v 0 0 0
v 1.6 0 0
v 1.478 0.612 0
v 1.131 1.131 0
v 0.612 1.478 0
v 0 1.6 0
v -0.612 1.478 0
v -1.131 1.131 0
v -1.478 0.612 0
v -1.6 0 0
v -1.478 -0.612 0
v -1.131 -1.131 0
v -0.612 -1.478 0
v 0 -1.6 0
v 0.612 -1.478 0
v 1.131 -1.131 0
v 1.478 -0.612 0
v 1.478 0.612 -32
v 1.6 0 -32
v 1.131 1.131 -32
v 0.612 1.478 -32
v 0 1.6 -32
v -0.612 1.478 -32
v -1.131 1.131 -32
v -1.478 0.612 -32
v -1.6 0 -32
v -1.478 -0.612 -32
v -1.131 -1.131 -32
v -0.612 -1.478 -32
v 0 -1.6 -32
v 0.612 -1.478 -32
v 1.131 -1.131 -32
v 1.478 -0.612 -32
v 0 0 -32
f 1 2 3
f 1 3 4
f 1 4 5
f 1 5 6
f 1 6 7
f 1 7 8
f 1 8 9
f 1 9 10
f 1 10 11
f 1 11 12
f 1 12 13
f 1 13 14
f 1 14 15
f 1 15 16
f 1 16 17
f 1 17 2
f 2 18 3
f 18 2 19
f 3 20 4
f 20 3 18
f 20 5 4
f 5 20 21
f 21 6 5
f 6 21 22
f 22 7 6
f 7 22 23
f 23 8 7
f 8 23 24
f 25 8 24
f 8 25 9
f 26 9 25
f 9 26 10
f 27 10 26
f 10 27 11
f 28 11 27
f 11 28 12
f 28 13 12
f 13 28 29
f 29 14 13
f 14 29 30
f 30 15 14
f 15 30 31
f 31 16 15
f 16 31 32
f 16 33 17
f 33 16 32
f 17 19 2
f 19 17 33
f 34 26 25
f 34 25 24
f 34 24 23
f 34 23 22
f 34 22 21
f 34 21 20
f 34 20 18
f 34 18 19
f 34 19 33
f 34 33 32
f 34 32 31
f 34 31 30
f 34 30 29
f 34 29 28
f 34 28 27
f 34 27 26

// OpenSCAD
// file: ../p/stud3.scad
use <../lib.scad>
use <4-4cyli.scad>
use <4-4disc.scad>
use <4-4edge.scad>
$fa=1; $fs=0.2;
function ldraw_lib__stud3(realsolid=false) = realsolid ? 
    [openscad(translate([0,0,-eps()], o=cylinder(4+eps(), r=4)),2)] : [
// 0 Stud Tube Solid
// 0 Name: stud3.dat
// 0 Author: James Jessiman
// 0 !LDRAW_ORG Primitive UPDATE 2012-01
// 0 !LICENSE Licensed under CC BY 2.0 and CC BY 4.0 : see CAreadme.txt
// 
// 0 BFC CERTIFY CCW
  [0,"BFC","CERTIFY"],
  [0,"BFC","CCW"],
// 
// 0 !HISTORY 2002-04-04 [sbliss] Modified for BFC compliance
// 0 !HISTORY 2002-04-25 [PTadmin] Official Update 2002-02
// 0 !HISTORY 2007-06-24 [PTadmin] Header formatted for Contributor Agreement
// 0 !HISTORY 2008-07-01 [PTadmin] Official Update 2008-01
// 0 !HISTORY 2012-02-16 [Philo] Changed to CCW
// 0 !HISTORY 2012-03-30 [PTadmin] Official Update 2012-01
// 
// 
// 1 16 0 -4 0 4 0 0 0 1 0 0 0 4 4-4edge.dat
  [1,16,0,-4,0,4,0,0,0,1,0,0,0,4, ldraw_lib__4_4edge(realsolid)],
// 1 16 0 0 0 4 0 0 0 1 0 0 0 4 4-4edge.dat
  [1,16,0,0,0,4,0,0,0,1,0,0,0,4, ldraw_lib__4_4edge(realsolid)],
// 1 16 0 -4 0 4 0 0 0 1 0 0 0 4 4-4disc.dat
  [1,16,0,-4,0,4,0,0,0,1,0,0,0,4, ldraw_lib__4_4disc(realsolid)],
// 1 16 0 -4 0 4 0 0 0 4 0 0 0 4 4-4cyli.dat
  [1,16,0,-4,0,4,0,0,0,4,0,0,0,4, ldraw_lib__4_4cyli(realsolid)],
];
module ldraw_lib__stud3(step=0, col=false, unit=2/5, alt=false, line=0.2, solid=!$preview)
    makepoly(ldraw_lib__stud3(solid), step=step, col=col, unit=unit, alt=alt, line=line, solid=solid);
ldraw_lib__stud3(line=0.2);
// file: ../p/stud.scad
use <../lib.scad>
use <4-4cyli.scad>
use <4-4disc.scad>
use <4-4edge.scad>
$fa=1; $fs=0.2;
function ldraw_lib__stud(realsolid=false) = realsolid ? 
    [openscad(translate([0,0,-eps()], o=cylinder(4+eps(), r=6)),2)] : [
// 0 Stud
// 0 Name: stud.dat
// 0 Author: James Jessiman
// 0 !LDRAW_ORG Primitive UPDATE 2012-01
// 0 !LICENSE Licensed under CC BY 2.0 and CC BY 4.0 : see CAreadme.txt
// 
// 0 BFC CERTIFY CCW
  [0,"BFC","CERTIFY"],
  [0,"BFC","CCW"],
// 
// 0 !HISTORY 2002-04-04 [sbliss] Modified for BFC compliance
// 0 !HISTORY 2002-04-25 [PTadmin] Official Update 2002-02
// 0 !HISTORY 2007-06-24 [PTadmin] Header formatted for Contributor Agreement
// 0 !HISTORY 2008-07-01 [PTadmin] Official Update 2008-01
// 0 !HISTORY 2012-02-16 [Philo] Changed to CCW
// 0 !HISTORY 2012-03-30 [PTadmin] Official Update 2012-01
// 
// 
// 1 16 0 0 0 6 0 0 0 1 0 0 0 6 4-4edge.dat
  [1,16,0,0,0,6,0,0,0,1,0,0,0,6, ldraw_lib__4_4edge(realsolid)],
// 1 16 0 -4 0 6 0 0 0 1 0 0 0 6 4-4edge.dat
  [1,16,0,-4,0,6,0,0,0,1,0,0,0,6, ldraw_lib__4_4edge(realsolid)],
// 1 16 0 0 0 6 0 0 0 -4 0 0 0 6 4-4cyli.dat
  [1,16,0,0,0,6,0,0,0,-4,0,0,0,6, ldraw_lib__4_4cyli(realsolid)],
// 1 16 0 -4 0 6 0 0 0 1 0 0 0 6 4-4disc.dat
  [1,16,0,-4,0,6,0,0,0,1,0,0,0,6, ldraw_lib__4_4disc(realsolid)],
];
module ldraw_lib__stud(step=0, col=false, unit=2/5, alt=false, line=0.2, solid=!$preview)
    makepoly(ldraw_lib__stud(solid), step=step, col=col, unit=unit, alt=alt, line=line, solid=solid);
ldraw_lib__stud(line=0.2);
// file: ../p/box5.scad
use <../lib.scad>
$fa=1; $fs=0.2;
function ldraw_lib__box5(realsolid=false) = [
// 0 Box with 5 Faces and All Edges
// 0 Name: box5.dat
// 0 Author: James Jessiman
// 0 !LDRAW_ORG Primitive UPDATE 2012-01
// 0 !LICENSE Licensed under CC BY 2.0 and CC BY 4.0 : see CAreadme.txt
// 
// 0 BFC CERTIFY CCW
  [0,"BFC","CERTIFY"],
  [0,"BFC","CCW"],
// 
// 0 !HISTORY 2002-04-03 [sbliss] Modified for BFC compliance
// 0 !HISTORY 2002-04-25 [PTadmin] Official Update 2002-02
// 0 !HISTORY 2007-06-24 [PTadmin] Header formatted for Contributor Agreement
// 0 !HISTORY 2008-07-01 [PTadmin] Official Update 2008-01
// 0 !HISTORY 2012-02-16 [Philo] Changed to CCW
// 0 !HISTORY 2012-03-30 [PTadmin] Official Update 2012-01
// 
// 
// 2 24 1 1 1 -1 1 1
  [2,24,1,1,1,-1,1,1],
// 2 24 -1 1 1 -1 1 -1
  [2,24,-1,1,1,-1,1,-1],
// 2 24 -1 1 -1 1 1 -1
  [2,24,-1,1,-1,1,1,-1],
// 2 24 1 1 -1 1 1 1
  [2,24,1,1,-1,1,1,1],
// 2 24 1 0 1 -1 0 1
  [2,24,1,0,1,-1,0,1],
// 2 24 -1 0 1 -1 0 -1
  [2,24,-1,0,1,-1,0,-1],
// 2 24 -1 0 -1 1 0 -1
  [2,24,-1,0,-1,1,0,-1],
// 2 24 1 0 -1 1 0 1
  [2,24,1,0,-1,1,0,1],
// 2 24 1 0 1 1 1 1
  [2,24,1,0,1,1,1,1],
// 2 24 -1 0 1 -1 1 1
  [2,24,-1,0,1,-1,1,1],
// 2 24 1 0 -1 1 1 -1
  [2,24,1,0,-1,1,1,-1],
// 2 24 -1 0 -1 -1 1 -1
  [2,24,-1,0,-1,-1,1,-1],
// 4 16 -1 1 1 1 1 1 1 1 -1 -1 1 -1
  [4,16,-1,1,1,1,1,1,1,1,-1,-1,1,-1],
// 4 16 -1 1 1 -1 0 1 1 0 1 1 1 1
  [4,16,-1,1,1,-1,0,1,1,0,1,1,1,1],
// 4 16 -1 1 -1 -1 0 -1 -1 0 1 -1 1 1
  [4,16,-1,1,-1,-1,0,-1,-1,0,1,-1,1,1],
// 4 16 1 1 -1 1 0 -1 -1 0 -1 -1 1 -1
  [4,16,1,1,-1,1,0,-1,-1,0,-1,-1,1,-1],
// 4 16 1 1 1 1 0 1 1 0 -1 1 1 -1
  [4,16,1,1,1,1,0,1,1,0,-1,1,1,-1],
];
module ldraw_lib__box5(step=0, col=false, unit=2/5, alt=false, line=0.2, solid=!$preview)
    makepoly(ldraw_lib__box5(solid), step=step, col=col, unit=unit, alt=alt, line=line, solid=solid);
ldraw_lib__box5(line=0.2);
// file: ../p/box4t.scad
use <../lib.scad>
$fa=1; $fs=0.2;
function ldraw_lib__box4t(realsolid=false) = [
// 0 Box with 4 Adjacent Faces and All Edges
// 0 Name: box4t.dat
// 0 Author: Tore Eriksson [Tore_Eriksson]
// 0 !LDRAW_ORG Primitive UPDATE 2003-02
// 0 !LICENSE Licensed under CC BY 2.0 and CC BY 4.0 : see CAreadme.txt
// 
// 0 BFC CERTIFY CCW
  [0,"BFC","CERTIFY"],
  [0,"BFC","CCW"],
// 
// 0 !HISTORY 1997-09-29 [PTadmin] Official Update 1997-15
// 0 !HISTORY 2002-08-31 [izanette] Modified with WINDZ for BFC compliance
// 0 !HISTORY 2003-08-01 [PTadmin] Official Update 2003-02
// 0 !HISTORY 2007-06-24 [PTadmin] Header formatted for Contributor Agreement
// 0 !HISTORY 2008-07-01 [PTadmin] Official Update 2008-01
// 
// 
// 2 24 1 1 1 -1 1 1
  [2,24,1,1,1,-1,1,1],
// 2 24 -1 1 1 -1 1 -1
  [2,24,-1,1,1,-1,1,-1],
// 2 24 -1 1 -1 1 1 -1
  [2,24,-1,1,-1,1,1,-1],
// 2 24 1 1 -1 1 1 1
  [2,24,1,1,-1,1,1,1],
// 2 24 1 0 1 -1 0 1
  [2,24,1,0,1,-1,0,1],
// 2 24 -1 0 1 -1 0 -1
  [2,24,-1,0,1,-1,0,-1],
// 2 24 -1 0 -1 1 0 -1
  [2,24,-1,0,-1,1,0,-1],
// 2 24 1 0 -1 1 0 1
  [2,24,1,0,-1,1,0,1],
// 2 24 1 0 1 1 1 1
  [2,24,1,0,1,1,1,1],
// 2 24 -1 0 1 -1 1 1
  [2,24,-1,0,1,-1,1,1],
// 2 24 1 0 -1 1 1 -1
  [2,24,1,0,-1,1,1,-1],
// 2 24 -1 0 -1 -1 1 -1
  [2,24,-1,0,-1,-1,1,-1],
// 4 16 1 1 1 1 1 -1 -1 1 -1 -1 1 1
  [4,16,1,1,1,1,1,-1,-1,1,-1,-1,1,1],
// 4 16 1 1 1 -1 1 1 -1 0 1 1 0 1
  [4,16,1,1,1,-1,1,1,-1,0,1,1,0,1],
// 4 16 -1 1 1 -1 1 -1 -1 0 -1 -1 0 1
  [4,16,-1,1,1,-1,1,-1,-1,0,-1,-1,0,1],
// 0 4 16 -1 1 -1 -1 0 -1 1 0 -1 1 1 -1
// 4 16 1 1 -1 1 1 1 1 0 1 1 0 -1
  [4,16,1,1,-1,1,1,1,1,0,1,1,0,-1],
// 0
];
module ldraw_lib__box4t(step=0, col=false, unit=2/5, alt=false, line=0.2, solid=!$preview)
    makepoly(ldraw_lib__box4t(solid), step=step, col=col, unit=unit, alt=alt, line=line, solid=solid);
ldraw_lib__box4t(line=0.2);
// file: s/3004s01.scad
use <../../lib.scad>
use <../../p/box4t.scad>
use <../../p/box5.scad>
use <../../p/stud.scad>
use <../../p/stud3.scad>
$fa=1; $fs=0.2;
function ldraw_lib__s__3004s01(realsolid=false) = [
// 0 ~Brick  1 x  2 without Front Face
// 0 Name: s\3004s01.dat
// 0 Author: James Jessiman
// 0 !LDRAW_ORG Subpart UPDATE 2003-03
// 0 !LICENSE Licensed under CC BY 2.0 and CC BY 4.0 : see CAreadme.txt
// 
// 0 BFC CERTIFY CCW
  [0,"BFC","CERTIFY"],
  [0,"BFC","CCW"],
// 
// 0 !HISTORY 2003-09-07 [jriley] Subfiling, BFC
// 0 !HISTORY 2003-12-19 [PTadmin] Official Update 2003-03
// 0 !HISTORY 2007-08-29 [PTadmin] Header formatted for Contributor Agreement
// 0 !HISTORY 2008-07-01 [PTadmin] Official Update 2008-01
// 
// 
// 1 16 0 4 0 1 0 0 0 -5 0 0 0 1 stud3.dat
  [1,16,0,4,0,1,0,0,0,-5,0,0,0,1, ldraw_lib__stud3(realsolid)],
// 0 BFC INVERTNEXT
  [0,"BFC","INVERTNEXT"],
// 1 16 0 24 0 16 0 0 0 -20 0 0 0 6 box5.dat
  [1,16,0,24,0,16,0,0,0,-20,0,0,0,6, ldraw_lib__box5(realsolid)],
// 4 16 20 24 10 16 24 6 -16 24 6 -20 24 10
  [4,16,20,24,10,16,24,6,-16,24,6,-20,24,10],
// 4 16 -20 24 10 -16 24 6 -16 24 -6 -20 24 -10
  [4,16,-20,24,10,-16,24,6,-16,24,-6,-20,24,-10],
// 4 16 -20 24 -10 -16 24 -6 16 24 -6 20 24 -10
  [4,16,-20,24,-10,-16,24,-6,16,24,-6,20,24,-10],
// 4 16 20 24 -10 16 24 -6 16 24 6 20 24 10
  [4,16,20,24,-10,16,24,-6,16,24,6,20,24,10],
// 1 16 0 24 0 20 0 0 0 -24 0 0 0 10 box4t.dat
  [1,16,0,24,0,20,0,0,0,-24,0,0,0,10, ldraw_lib__box4t(realsolid)],
// 1 16 10 0 0 1 0 0 0 1 0 0 0 1 stud.dat
  [1,16,10,0,0,1,0,0,0,1,0,0,0,1, ldraw_lib__stud(realsolid)],
// 1 16 -10 0 0 1 0 0 0 1 0 0 0 1 stud.dat
  [1,16,-10,0,0,1,0,0,0,1,0,0,0,1, ldraw_lib__stud(realsolid)],
// 0
];
module ldraw_lib__s__3004s01(step=0, col=false, unit=2/5, alt=false, line=0.2, solid=!$preview)
    makepoly(ldraw_lib__s__3004s01(solid), step=step, col=col, unit=unit, alt=alt, line=line, solid=solid);
ldraw_lib__s__3004s01(line=0.2);
// file: 3004.scad
use <../lib.scad>
use <s/3004s01.scad>
$fa=1; $fs=0.2;
function ldraw_lib__3004(realsolid=false) = [
// 0 Brick  1 x  2
// 0 Name: 3004.dat
// 0 Author: James Jessiman
// 0 !LDRAW_ORG Part UPDATE 2022-05
// 0 !LICENSE Licensed under CC BY 2.0 and CC BY 4.0 : see CAreadme.txt
// 
// 0 BFC CERTIFY CCW
  [0,"BFC","CERTIFY"],
  [0,"BFC","CCW"],
// 
// 0 !HISTORY 2001-10-26 [PTadmin] Official Update 2001-01
// 0 !HISTORY 2002-05-07 {unknown} BFC Certification
// 0 !HISTORY 2002-06-11 [PTadmin] Official Update 2002-03
// 0 !HISTORY 2007-05-07 [PTadmin] Header formatted for Contributor Agreement
// 0 !HISTORY 2008-07-01 [PTadmin] Official Update 2008-01
// 0 !HISTORY 2022-08-04 [MagFors] Using subfile
// 0 !HISTORY 2022-09-15 [PTadmin] Official Update 2022-05
// 
// 
// 1 16 0 0 0 1 0 0 0 1 0 0 0 1 s\3004s01.dat
  [1,16,0,0,0,1,0,0,0,1,0,0,0,1, ldraw_lib__s__3004s01(realsolid)],
// 4 16 -20 24 -10 20 24 -10 20 0 -10 -20 0 -10
  [4,16,-20,24,-10,20,24,-10,20,0,-10,-20,0,-10],
];
module ldraw_lib__3004(step=0, col=false, unit=2/5, alt=false, line=0.2, solid=!$preview)
    makepoly(ldraw_lib__3004(solid), step=step, col=col, unit=unit, alt=alt, line=line, solid=solid);
ldraw_lib__3004(line=0.2);
// file: ../p/4-4edge.scad
use <../lib.scad>
$fa=1; $fs=0.2;
function ldraw_lib__4_4edge(realsolid=false) = [
// 0 Circle 1.0
// 0 Name: 4-4edge.dat
// 0 Author: James Jessiman
// 0 !LDRAW_ORG Primitive UPDATE 2017-01
// 0 !LICENSE Licensed under CC BY 2.0 and CC BY 4.0 : see CAreadme.txt
// 
// 0 BFC CERTIFY CCW
  [0,"BFC","CERTIFY"],
  [0,"BFC","CCW"],
// 
// 0 !HISTORY 1998-12-15 [PTadmin] Official Update 1998-10
// 0 !HISTORY 2005-12-28 [PTadmin] Official Update 2005-01
// 0 !HISTORY 2007-06-24 [PTadmin] Header formatted for Contributor Agreement
// 0 !HISTORY 2008-07-01 [PTadmin] Official Update 2008-01
// 0 !HISTORY 2017-01-15 [Steffen] BFCed
// 0 !HISTORY 2017-12-30 [PTadmin] Official Update 2017-01
// 
// 
// 2 24 1 0 0 0.9239 0 0.3827
  [2,24,1,0,0,0.9239,0,0.3827],
// 2 24 0.9239 0 0.3827 0.7071 0 0.7071
  [2,24,0.9239,0,0.3827,0.7071,0,0.7071],
// 2 24 0.7071 0 0.7071 0.3827 0 0.9239
  [2,24,0.7071,0,0.7071,0.3827,0,0.9239],
// 2 24 0.3827 0 0.9239 0 0 1
  [2,24,0.3827,0,0.9239,0,0,1],
// 2 24 0 0 1 -0.3827 0 0.9239
  [2,24,0,0,1,-0.3827,0,0.9239],
// 2 24 -0.3827 0 0.9239 -0.7071 0 0.7071
  [2,24,-0.3827,0,0.9239,-0.7071,0,0.7071],
// 2 24 -0.7071 0 0.7071 -0.9239 0 0.3827
  [2,24,-0.7071,0,0.7071,-0.9239,0,0.3827],
// 2 24 -0.9239 0 0.3827 -1 0 -0
  [2,24,-0.9239,0,0.3827,-1,0,-0],
// 2 24 -1 0 -0 -0.9239 0 -0.3827
  [2,24,-1,0,-0,-0.9239,0,-0.3827],
// 2 24 -0.9239 0 -0.3827 -0.7071 0 -0.7071
  [2,24,-0.9239,0,-0.3827,-0.7071,0,-0.7071],
// 2 24 -0.7071 0 -0.7071 -0.3827 0 -0.9239
  [2,24,-0.7071,0,-0.7071,-0.3827,0,-0.9239],
// 2 24 -0.3827 0 -0.9239 0 0 -1
  [2,24,-0.3827,0,-0.9239,0,0,-1],
// 2 24 0 0 -1 0.3827 0 -0.9239
  [2,24,0,0,-1,0.3827,0,-0.9239],
// 2 24 0.3827 0 -0.9239 0.7071 0 -0.7071
  [2,24,0.3827,0,-0.9239,0.7071,0,-0.7071],
// 2 24 0.7071 0 -0.7071 0.9239 0 -0.3827
  [2,24,0.7071,0,-0.7071,0.9239,0,-0.3827],
// 2 24 0.9239 0 -0.3827 1 0 0
  [2,24,0.9239,0,-0.3827,1,0,0],
];
module ldraw_lib__4_4edge(step=0, col=false, unit=2/5, alt=false, line=0.2, solid=!$preview)
    makepoly(ldraw_lib__4_4edge(solid), step=step, col=col, unit=unit, alt=alt, line=line, solid=solid);
ldraw_lib__4_4edge(line=0.2);
// file: ../p/4-4disc.scad
use <../lib.scad>
$fa=1; $fs=0.2;
function ldraw_lib__4_4disc(realsolid=false) = [
// 0 Disc 1.0
// 0 Name: 4-4disc.dat
// 0 Author: James Jessiman
// 0 !LDRAW_ORG Primitive UPDATE 2002-02
// 0 !LICENSE Licensed under CC BY 2.0 and CC BY 4.0 : see CAreadme.txt
// 
// 0 BFC CERTIFY CCW
  [0,"BFC","CERTIFY"],
  [0,"BFC","CCW"],
// 
// 0 !HISTORY 1998-12-15 [PTadmin] Official Update 1998-10
// 0 !HISTORY 2002-03-23 [sbliss] Added BFC statement
// 0 !HISTORY 2002-04-25 [PTadmin] Official Update 2002-02
// 0 !HISTORY 2007-06-24 [PTadmin] Header formatted for Contributor Agreement
// 0 !HISTORY 2008-07-01 [PTadmin] Official Update 2008-01
// 
// 
// 3 16 0 0 0 1 0 0 0.9239 0 0.3827
  [3,16,0,0,0,1,0,0,0.9239,0,0.3827],
// 3 16 0 0 0 0.9239 0 0.3827 0.7071 0 0.7071
  [3,16,0,0,0,0.9239,0,0.3827,0.7071,0,0.7071],
// 3 16 0 0 0 0.7071 0 0.7071 0.3827 0 0.9239
  [3,16,0,0,0,0.7071,0,0.7071,0.3827,0,0.9239],
// 3 16 0 0 0 0.3827 0 0.9239 0 0 1
  [3,16,0,0,0,0.3827,0,0.9239,0,0,1],
// 3 16 0 0 0 0 0 1 -0.3827 0 0.9239
  [3,16,0,0,0,0,0,1,-0.3827,0,0.9239],
// 3 16 0 0 0 -0.3827 0 0.9239 -0.7071 0 0.7071
  [3,16,0,0,0,-0.3827,0,0.9239,-0.7071,0,0.7071],
// 3 16 0 0 0 -0.7071 0 0.7071 -0.9239 0 0.3827
  [3,16,0,0,0,-0.7071,0,0.7071,-0.9239,0,0.3827],
// 3 16 0 0 0 -0.9239 0 0.3827 -1 0 -0
  [3,16,0,0,0,-0.9239,0,0.3827,-1,0,-0],
// 3 16 0 0 0 -1 0 -0 -0.9239 0 -0.3827
  [3,16,0,0,0,-1,0,-0,-0.9239,0,-0.3827],
// 3 16 0 0 0 -0.9239 0 -0.3827 -0.7071 0 -0.7071
  [3,16,0,0,0,-0.9239,0,-0.3827,-0.7071,0,-0.7071],
// 3 16 0 0 0 -0.7071 0 -0.7071 -0.3827 0 -0.9239
  [3,16,0,0,0,-0.7071,0,-0.7071,-0.3827,0,-0.9239],
// 3 16 0 0 0 -0.3827 0 -0.9239 0 0 -1
  [3,16,0,0,0,-0.3827,0,-0.9239,0,0,-1],
// 3 16 0 0 0 0 0 -1 0.3827 0 -0.9239
  [3,16,0,0,0,0,0,-1,0.3827,0,-0.9239],
// 3 16 0 0 0 0.3827 0 -0.9239 0.7071 0 -0.7071
  [3,16,0,0,0,0.3827,0,-0.9239,0.7071,0,-0.7071],
// 3 16 0 0 0 0.7071 0 -0.7071 0.9239 0 -0.3827
  [3,16,0,0,0,0.7071,0,-0.7071,0.9239,0,-0.3827],
// 3 16 0 0 0 0.9239 0 -0.3827 1 0 0
  [3,16,0,0,0,0.9239,0,-0.3827,1,0,0],
// 0
];
module ldraw_lib__4_4disc(step=0, col=false, unit=2/5, alt=false, line=0.2, solid=!$preview)
    makepoly(ldraw_lib__4_4disc(solid), step=step, col=col, unit=unit, alt=alt, line=line, solid=solid);
ldraw_lib__4_4disc(line=0.2);
// file: ../p/4-4cyli.scad
use <../lib.scad>
$fa=1; $fs=0.2;
function ldraw_lib__4_4cyli(realsolid=false) = [
// 0 Cylinder 1.0
// 0 Name: 4-4cyli.dat
// 0 Author: James Jessiman
// 0 !LDRAW_ORG Primitive UPDATE 2005-01
// 0 !LICENSE Licensed under CC BY 2.0 and CC BY 4.0 : see CAreadme.txt
// 
// 0 BFC CERTIFY CCW
  [0,"BFC","CERTIFY"],
  [0,"BFC","CCW"],
// 
// 0 !HISTORY 1998-12-15 [PTadmin] Official Update 1998-10
// 0 !HISTORY 2002-03-23 [sbliss] Added BFC statement; merged headers from files in distributions LDraw 0.27 and Complete.
// 0 !HISTORY 2002-04-25 [PTadmin] Official Update 2002-02
// 0 !HISTORY 2004-12-14 [guyvivan] BFC CCW
// 0 !HISTORY 2005-12-28 [PTadmin] Official Update 2005-01
// 0 !HISTORY 2007-06-24 [PTadmin] Header formatted for Contributor Agreement
// 0 !HISTORY 2008-07-01 [PTadmin] Official Update 2008-01
// 
// 
// 4 16 1 1 0 0.9239 1 0.3827 0.9239 0 0.3827 1 0 0
  [4,16,1,1,0,0.9239,1,0.3827,0.9239,0,0.3827,1,0,0],
// 5 24 1 0 0 1 1 0 0.9239 0 0.3827 0.9239 0 -0.3827
  [5,24,1,0,0,1,1,0,0.9239,0,0.3827,0.9239,0,-0.3827],
// 4 16 0.9239 1 0.3827 0.7071 1 0.7071 0.7071 0 0.7071 0.9239 0 0.3827
  [4,16,0.9239,1,0.3827,0.7071,1,0.7071,0.7071,0,0.7071,0.9239,0,0.3827],
// 5 24 0.9239 0 0.3827 0.9239 1 0.3827 0.7071 0 0.7071 1 0 0
  [5,24,0.9239,0,0.3827,0.9239,1,0.3827,0.7071,0,0.7071,1,0,0],
// 4 16 0.7071 1 0.7071 0.3827 1 0.9239 0.3827 0 0.9239 0.7071 0 0.7071
  [4,16,0.7071,1,0.7071,0.3827,1,0.9239,0.3827,0,0.9239,0.7071,0,0.7071],
// 5 24 0.7071 0 0.7071 0.7071 1 0.7071 0.3827 0 0.9239 0.9239 0 0.3827
  [5,24,0.7071,0,0.7071,0.7071,1,0.7071,0.3827,0,0.9239,0.9239,0,0.3827],
// 4 16 0.3827 1 0.9239 0 1 1 0 0 1 0.3827 0 0.9239
  [4,16,0.3827,1,0.9239,0,1,1,0,0,1,0.3827,0,0.9239],
// 5 24 0.3827 0 0.9239 0.3827 1 0.9239 0 0 1 0.7071 0 0.7071
  [5,24,0.3827,0,0.9239,0.3827,1,0.9239,0,0,1,0.7071,0,0.7071],
// 4 16 0 1 1 -0.3827 1 0.9239 -0.3827 0 0.9239 0 0 1
  [4,16,0,1,1,-0.3827,1,0.9239,-0.3827,0,0.9239,0,0,1],
// 5 24 0 0 1 0 1 1 -0.3827 0 0.9239 0.3827 0 0.9239
  [5,24,0,0,1,0,1,1,-0.3827,0,0.9239,0.3827,0,0.9239],
// 4 16 -0.3827 1 0.9239 -0.7071 1 0.7071 -0.7071 0 0.7071 -0.3827 0 0.9239
  [4,16,-0.3827,1,0.9239,-0.7071,1,0.7071,-0.7071,0,0.7071,-0.3827,0,0.9239],
// 5 24 -0.3827 0 0.9239 -0.3827 1 0.9239 -0.7071 0 0.7071 0 0 1
  [5,24,-0.3827,0,0.9239,-0.3827,1,0.9239,-0.7071,0,0.7071,0,0,1],
// 4 16 -0.7071 1 0.7071 -0.9239 1 0.3827 -0.9239 0 0.3827 -0.7071 0 0.7071
  [4,16,-0.7071,1,0.7071,-0.9239,1,0.3827,-0.9239,0,0.3827,-0.7071,0,0.7071],
// 5 24 -0.7071 0 0.7071 -0.7071 1 0.7071 -0.9239 0 0.3827 -0.3827 0 0.9239
  [5,24,-0.7071,0,0.7071,-0.7071,1,0.7071,-0.9239,0,0.3827,-0.3827,0,0.9239],
// 4 16 -0.9239 1 0.3827 -1 1 0 -1 0 0 -0.9239 0 0.3827
  [4,16,-0.9239,1,0.3827,-1,1,0,-1,0,0,-0.9239,0,0.3827],
// 5 24 -0.9239 0 0.3827 -0.9239 1 0.3827 -1 0 0 -0.7071 0 0.7071
  [5,24,-0.9239,0,0.3827,-0.9239,1,0.3827,-1,0,0,-0.7071,0,0.7071],
// 4 16 -1 1 0 -0.9239 1 -0.3827 -0.9239 0 -0.3827 -1 0 0
  [4,16,-1,1,0,-0.9239,1,-0.3827,-0.9239,0,-0.3827,-1,0,0],
// 5 24 -1 0 0 -1 1 0 -0.9239 0 -0.3827 -0.9239 0 0.3827
  [5,24,-1,0,0,-1,1,0,-0.9239,0,-0.3827,-0.9239,0,0.3827],
// 4 16 -0.9239 1 -0.3827 -0.7071 1 -0.7071 -0.7071 0 -0.7071 -0.9239 0 -0.3827
  [4,16,-0.9239,1,-0.3827,-0.7071,1,-0.7071,-0.7071,0,-0.7071,-0.9239,0,-0.3827],
// 5 24 -0.9239 0 -0.3827 -0.9239 1 -0.3827 -0.7071 0 -0.7071 -1 0 0
  [5,24,-0.9239,0,-0.3827,-0.9239,1,-0.3827,-0.7071,0,-0.7071,-1,0,0],
// 4 16 -0.7071 1 -0.7071 -0.3827 1 -0.9239 -0.3827 0 -0.9239 -0.7071 0 -0.7071
  [4,16,-0.7071,1,-0.7071,-0.3827,1,-0.9239,-0.3827,0,-0.9239,-0.7071,0,-0.7071],
// 5 24 -0.7071 0 -0.7071 -0.7071 1 -0.7071 -0.3827 0 -0.9239 -0.9239 0 -0.3827
  [5,24,-0.7071,0,-0.7071,-0.7071,1,-0.7071,-0.3827,0,-0.9239,-0.9239,0,-0.3827],
// 4 16 -0.3827 1 -0.9239 0 1 -1 0 0 -1 -0.3827 0 -0.9239
  [4,16,-0.3827,1,-0.9239,0,1,-1,0,0,-1,-0.3827,0,-0.9239],
// 5 24 -0.3827 0 -0.9239 -0.3827 1 -0.9239 0 0 -1 -0.7071 0 -0.7071
  [5,24,-0.3827,0,-0.9239,-0.3827,1,-0.9239,0,0,-1,-0.7071,0,-0.7071],
// 4 16 0 1 -1 0.3827 1 -0.9239 0.3827 0 -0.9239 0 0 -1
  [4,16,0,1,-1,0.3827,1,-0.9239,0.3827,0,-0.9239,0,0,-1],
// 5 24 0 0 -1 0 1 -1 0.3827 0 -0.9239 -0.3827 0 -0.9239
  [5,24,0,0,-1,0,1,-1,0.3827,0,-0.9239,-0.3827,0,-0.9239],
// 4 16 0.3827 1 -0.9239 0.7071 1 -0.7071 0.7071 0 -0.7071 0.3827 0 -0.9239
  [4,16,0.3827,1,-0.9239,0.7071,1,-0.7071,0.7071,0,-0.7071,0.3827,0,-0.9239],
// 5 24 0.3827 0 -0.9239 0.3827 1 -0.9239 0.7071 0 -0.7071 0 0 -1
  [5,24,0.3827,0,-0.9239,0.3827,1,-0.9239,0.7071,0,-0.7071,0,0,-1],
// 4 16 0.7071 1 -0.7071 0.9239 1 -0.3827 0.9239 0 -0.3827 0.7071 0 -0.7071
  [4,16,0.7071,1,-0.7071,0.9239,1,-0.3827,0.9239,0,-0.3827,0.7071,0,-0.7071],
// 5 24 0.7071 0 -0.7071 0.7071 1 -0.7071 0.9239 0 -0.3827 0.3827 0 -0.9239
  [5,24,0.7071,0,-0.7071,0.7071,1,-0.7071,0.9239,0,-0.3827,0.3827,0,-0.9239],
// 4 16 0.9239 1 -0.3827 1 1 0 1 0 0 0.9239 0 -0.3827
  [4,16,0.9239,1,-0.3827,1,1,0,1,0,0,0.9239,0,-0.3827],
// 5 24 0.9239 0 -0.3827 0.9239 1 -0.3827 1 0 0 0.7071 0 -0.7071
  [5,24,0.9239,0,-0.3827,0.9239,1,-0.3827,1,0,0,0.7071,0,-0.7071],
// 0
];
module ldraw_lib__4_4cyli(step=0, col=false, unit=2/5, alt=false, line=0.2, solid=!$preview)
    makepoly(ldraw_lib__4_4cyli(solid), step=step, col=col, unit=unit, alt=alt, line=line, solid=solid);
ldraw_lib__4_4cyli(line=0.2);
// main file
use <../lib.scad>
use <../p/4-4cyli.scad>
use <../p/4-4disc.scad>
use <../p/4-4edge.scad>
$fa=1; $fs=0.2;
function ldraw_lib__30374(realsolid=false) = [
// 0 Bar  4L Lightsaber Blade
// 0 Name: 30374.dat
// 0 Author: Steve Bliss [sbliss]
// 0 !LDRAW_ORG Part UPDATE 2018-01
// 0 !LICENSE Licensed under CC BY 2.0 and CC BY 4.0 : see CAreadme.txt
// 
// 0 BFC CERTIFY CW
  [0,"BFC","CERTIFY"],
  [0,"BFC","CW"],
// 
// 0 !KEYWORDS bar, minifig accessory, saber, Star Wars, tool
// 
// 0 !HISTORY 2002-07-26 [sbliss] Corrected spacing in title, applied BFC
// 0 !HISTORY 2003-08-01 [PTadmin] Official Update 2003-02
// 0 !HISTORY 2007-06-07 [PTadmin] Header formatted for Contributor Agreement
// 0 !HISTORY 2008-07-01 [PTadmin] Official Update 2008-01
// 0 !HISTORY 2017-12-31 [cwdee] Correct lightsaber spelling
// 0 !HISTORY 2018-01-30 [PTadmin] Official Update 2018-01
// 
// 
// 1 16 0 0 0 4 0 0 0 1 0 0 0 4 4-4edge.dat
  [1,16,0,0,0,4,0,0,0,1,0,0,0,4, ldraw_lib__4_4edge(realsolid)],
// 1 16 0 80 0 4 0 0 0 1 0 0 0 4 4-4edge.dat
  [1,16,0,80,0,4,0,0,0,1,0,0,0,4, ldraw_lib__4_4edge(realsolid)],
// 1 16 0 0 0 4 0 0 0 1 0 0 0 4 4-4disc.dat
  [1,16,0,0,0,4,0,0,0,1,0,0,0,4, ldraw_lib__4_4disc(realsolid)],
// 1 16 0 0 0 4 0 0 0 80 0 0 0 4 4-4cyli.dat
  [1,16,0,0,0,4,0,0,0,80,0,0,0,4, ldraw_lib__4_4cyli(realsolid)],
// 1 16 0 80 0 -4 0 0 0 -1 0 0 0 4 4-4disc.dat
  [1,16,0,80,0,-4,0,0,0,-1,0,0,0,4, ldraw_lib__4_4disc(realsolid)],
// 0
];
module ldraw_lib__30374(step=0, col=false, unit=2/5, alt=false, line=0.2, solid=!$preview)
    makepoly(ldraw_lib__30374(solid), step=step, col=col, unit=unit, alt=alt, line=line, solid=solid);
ldraw_lib__30374(line=0.2);
